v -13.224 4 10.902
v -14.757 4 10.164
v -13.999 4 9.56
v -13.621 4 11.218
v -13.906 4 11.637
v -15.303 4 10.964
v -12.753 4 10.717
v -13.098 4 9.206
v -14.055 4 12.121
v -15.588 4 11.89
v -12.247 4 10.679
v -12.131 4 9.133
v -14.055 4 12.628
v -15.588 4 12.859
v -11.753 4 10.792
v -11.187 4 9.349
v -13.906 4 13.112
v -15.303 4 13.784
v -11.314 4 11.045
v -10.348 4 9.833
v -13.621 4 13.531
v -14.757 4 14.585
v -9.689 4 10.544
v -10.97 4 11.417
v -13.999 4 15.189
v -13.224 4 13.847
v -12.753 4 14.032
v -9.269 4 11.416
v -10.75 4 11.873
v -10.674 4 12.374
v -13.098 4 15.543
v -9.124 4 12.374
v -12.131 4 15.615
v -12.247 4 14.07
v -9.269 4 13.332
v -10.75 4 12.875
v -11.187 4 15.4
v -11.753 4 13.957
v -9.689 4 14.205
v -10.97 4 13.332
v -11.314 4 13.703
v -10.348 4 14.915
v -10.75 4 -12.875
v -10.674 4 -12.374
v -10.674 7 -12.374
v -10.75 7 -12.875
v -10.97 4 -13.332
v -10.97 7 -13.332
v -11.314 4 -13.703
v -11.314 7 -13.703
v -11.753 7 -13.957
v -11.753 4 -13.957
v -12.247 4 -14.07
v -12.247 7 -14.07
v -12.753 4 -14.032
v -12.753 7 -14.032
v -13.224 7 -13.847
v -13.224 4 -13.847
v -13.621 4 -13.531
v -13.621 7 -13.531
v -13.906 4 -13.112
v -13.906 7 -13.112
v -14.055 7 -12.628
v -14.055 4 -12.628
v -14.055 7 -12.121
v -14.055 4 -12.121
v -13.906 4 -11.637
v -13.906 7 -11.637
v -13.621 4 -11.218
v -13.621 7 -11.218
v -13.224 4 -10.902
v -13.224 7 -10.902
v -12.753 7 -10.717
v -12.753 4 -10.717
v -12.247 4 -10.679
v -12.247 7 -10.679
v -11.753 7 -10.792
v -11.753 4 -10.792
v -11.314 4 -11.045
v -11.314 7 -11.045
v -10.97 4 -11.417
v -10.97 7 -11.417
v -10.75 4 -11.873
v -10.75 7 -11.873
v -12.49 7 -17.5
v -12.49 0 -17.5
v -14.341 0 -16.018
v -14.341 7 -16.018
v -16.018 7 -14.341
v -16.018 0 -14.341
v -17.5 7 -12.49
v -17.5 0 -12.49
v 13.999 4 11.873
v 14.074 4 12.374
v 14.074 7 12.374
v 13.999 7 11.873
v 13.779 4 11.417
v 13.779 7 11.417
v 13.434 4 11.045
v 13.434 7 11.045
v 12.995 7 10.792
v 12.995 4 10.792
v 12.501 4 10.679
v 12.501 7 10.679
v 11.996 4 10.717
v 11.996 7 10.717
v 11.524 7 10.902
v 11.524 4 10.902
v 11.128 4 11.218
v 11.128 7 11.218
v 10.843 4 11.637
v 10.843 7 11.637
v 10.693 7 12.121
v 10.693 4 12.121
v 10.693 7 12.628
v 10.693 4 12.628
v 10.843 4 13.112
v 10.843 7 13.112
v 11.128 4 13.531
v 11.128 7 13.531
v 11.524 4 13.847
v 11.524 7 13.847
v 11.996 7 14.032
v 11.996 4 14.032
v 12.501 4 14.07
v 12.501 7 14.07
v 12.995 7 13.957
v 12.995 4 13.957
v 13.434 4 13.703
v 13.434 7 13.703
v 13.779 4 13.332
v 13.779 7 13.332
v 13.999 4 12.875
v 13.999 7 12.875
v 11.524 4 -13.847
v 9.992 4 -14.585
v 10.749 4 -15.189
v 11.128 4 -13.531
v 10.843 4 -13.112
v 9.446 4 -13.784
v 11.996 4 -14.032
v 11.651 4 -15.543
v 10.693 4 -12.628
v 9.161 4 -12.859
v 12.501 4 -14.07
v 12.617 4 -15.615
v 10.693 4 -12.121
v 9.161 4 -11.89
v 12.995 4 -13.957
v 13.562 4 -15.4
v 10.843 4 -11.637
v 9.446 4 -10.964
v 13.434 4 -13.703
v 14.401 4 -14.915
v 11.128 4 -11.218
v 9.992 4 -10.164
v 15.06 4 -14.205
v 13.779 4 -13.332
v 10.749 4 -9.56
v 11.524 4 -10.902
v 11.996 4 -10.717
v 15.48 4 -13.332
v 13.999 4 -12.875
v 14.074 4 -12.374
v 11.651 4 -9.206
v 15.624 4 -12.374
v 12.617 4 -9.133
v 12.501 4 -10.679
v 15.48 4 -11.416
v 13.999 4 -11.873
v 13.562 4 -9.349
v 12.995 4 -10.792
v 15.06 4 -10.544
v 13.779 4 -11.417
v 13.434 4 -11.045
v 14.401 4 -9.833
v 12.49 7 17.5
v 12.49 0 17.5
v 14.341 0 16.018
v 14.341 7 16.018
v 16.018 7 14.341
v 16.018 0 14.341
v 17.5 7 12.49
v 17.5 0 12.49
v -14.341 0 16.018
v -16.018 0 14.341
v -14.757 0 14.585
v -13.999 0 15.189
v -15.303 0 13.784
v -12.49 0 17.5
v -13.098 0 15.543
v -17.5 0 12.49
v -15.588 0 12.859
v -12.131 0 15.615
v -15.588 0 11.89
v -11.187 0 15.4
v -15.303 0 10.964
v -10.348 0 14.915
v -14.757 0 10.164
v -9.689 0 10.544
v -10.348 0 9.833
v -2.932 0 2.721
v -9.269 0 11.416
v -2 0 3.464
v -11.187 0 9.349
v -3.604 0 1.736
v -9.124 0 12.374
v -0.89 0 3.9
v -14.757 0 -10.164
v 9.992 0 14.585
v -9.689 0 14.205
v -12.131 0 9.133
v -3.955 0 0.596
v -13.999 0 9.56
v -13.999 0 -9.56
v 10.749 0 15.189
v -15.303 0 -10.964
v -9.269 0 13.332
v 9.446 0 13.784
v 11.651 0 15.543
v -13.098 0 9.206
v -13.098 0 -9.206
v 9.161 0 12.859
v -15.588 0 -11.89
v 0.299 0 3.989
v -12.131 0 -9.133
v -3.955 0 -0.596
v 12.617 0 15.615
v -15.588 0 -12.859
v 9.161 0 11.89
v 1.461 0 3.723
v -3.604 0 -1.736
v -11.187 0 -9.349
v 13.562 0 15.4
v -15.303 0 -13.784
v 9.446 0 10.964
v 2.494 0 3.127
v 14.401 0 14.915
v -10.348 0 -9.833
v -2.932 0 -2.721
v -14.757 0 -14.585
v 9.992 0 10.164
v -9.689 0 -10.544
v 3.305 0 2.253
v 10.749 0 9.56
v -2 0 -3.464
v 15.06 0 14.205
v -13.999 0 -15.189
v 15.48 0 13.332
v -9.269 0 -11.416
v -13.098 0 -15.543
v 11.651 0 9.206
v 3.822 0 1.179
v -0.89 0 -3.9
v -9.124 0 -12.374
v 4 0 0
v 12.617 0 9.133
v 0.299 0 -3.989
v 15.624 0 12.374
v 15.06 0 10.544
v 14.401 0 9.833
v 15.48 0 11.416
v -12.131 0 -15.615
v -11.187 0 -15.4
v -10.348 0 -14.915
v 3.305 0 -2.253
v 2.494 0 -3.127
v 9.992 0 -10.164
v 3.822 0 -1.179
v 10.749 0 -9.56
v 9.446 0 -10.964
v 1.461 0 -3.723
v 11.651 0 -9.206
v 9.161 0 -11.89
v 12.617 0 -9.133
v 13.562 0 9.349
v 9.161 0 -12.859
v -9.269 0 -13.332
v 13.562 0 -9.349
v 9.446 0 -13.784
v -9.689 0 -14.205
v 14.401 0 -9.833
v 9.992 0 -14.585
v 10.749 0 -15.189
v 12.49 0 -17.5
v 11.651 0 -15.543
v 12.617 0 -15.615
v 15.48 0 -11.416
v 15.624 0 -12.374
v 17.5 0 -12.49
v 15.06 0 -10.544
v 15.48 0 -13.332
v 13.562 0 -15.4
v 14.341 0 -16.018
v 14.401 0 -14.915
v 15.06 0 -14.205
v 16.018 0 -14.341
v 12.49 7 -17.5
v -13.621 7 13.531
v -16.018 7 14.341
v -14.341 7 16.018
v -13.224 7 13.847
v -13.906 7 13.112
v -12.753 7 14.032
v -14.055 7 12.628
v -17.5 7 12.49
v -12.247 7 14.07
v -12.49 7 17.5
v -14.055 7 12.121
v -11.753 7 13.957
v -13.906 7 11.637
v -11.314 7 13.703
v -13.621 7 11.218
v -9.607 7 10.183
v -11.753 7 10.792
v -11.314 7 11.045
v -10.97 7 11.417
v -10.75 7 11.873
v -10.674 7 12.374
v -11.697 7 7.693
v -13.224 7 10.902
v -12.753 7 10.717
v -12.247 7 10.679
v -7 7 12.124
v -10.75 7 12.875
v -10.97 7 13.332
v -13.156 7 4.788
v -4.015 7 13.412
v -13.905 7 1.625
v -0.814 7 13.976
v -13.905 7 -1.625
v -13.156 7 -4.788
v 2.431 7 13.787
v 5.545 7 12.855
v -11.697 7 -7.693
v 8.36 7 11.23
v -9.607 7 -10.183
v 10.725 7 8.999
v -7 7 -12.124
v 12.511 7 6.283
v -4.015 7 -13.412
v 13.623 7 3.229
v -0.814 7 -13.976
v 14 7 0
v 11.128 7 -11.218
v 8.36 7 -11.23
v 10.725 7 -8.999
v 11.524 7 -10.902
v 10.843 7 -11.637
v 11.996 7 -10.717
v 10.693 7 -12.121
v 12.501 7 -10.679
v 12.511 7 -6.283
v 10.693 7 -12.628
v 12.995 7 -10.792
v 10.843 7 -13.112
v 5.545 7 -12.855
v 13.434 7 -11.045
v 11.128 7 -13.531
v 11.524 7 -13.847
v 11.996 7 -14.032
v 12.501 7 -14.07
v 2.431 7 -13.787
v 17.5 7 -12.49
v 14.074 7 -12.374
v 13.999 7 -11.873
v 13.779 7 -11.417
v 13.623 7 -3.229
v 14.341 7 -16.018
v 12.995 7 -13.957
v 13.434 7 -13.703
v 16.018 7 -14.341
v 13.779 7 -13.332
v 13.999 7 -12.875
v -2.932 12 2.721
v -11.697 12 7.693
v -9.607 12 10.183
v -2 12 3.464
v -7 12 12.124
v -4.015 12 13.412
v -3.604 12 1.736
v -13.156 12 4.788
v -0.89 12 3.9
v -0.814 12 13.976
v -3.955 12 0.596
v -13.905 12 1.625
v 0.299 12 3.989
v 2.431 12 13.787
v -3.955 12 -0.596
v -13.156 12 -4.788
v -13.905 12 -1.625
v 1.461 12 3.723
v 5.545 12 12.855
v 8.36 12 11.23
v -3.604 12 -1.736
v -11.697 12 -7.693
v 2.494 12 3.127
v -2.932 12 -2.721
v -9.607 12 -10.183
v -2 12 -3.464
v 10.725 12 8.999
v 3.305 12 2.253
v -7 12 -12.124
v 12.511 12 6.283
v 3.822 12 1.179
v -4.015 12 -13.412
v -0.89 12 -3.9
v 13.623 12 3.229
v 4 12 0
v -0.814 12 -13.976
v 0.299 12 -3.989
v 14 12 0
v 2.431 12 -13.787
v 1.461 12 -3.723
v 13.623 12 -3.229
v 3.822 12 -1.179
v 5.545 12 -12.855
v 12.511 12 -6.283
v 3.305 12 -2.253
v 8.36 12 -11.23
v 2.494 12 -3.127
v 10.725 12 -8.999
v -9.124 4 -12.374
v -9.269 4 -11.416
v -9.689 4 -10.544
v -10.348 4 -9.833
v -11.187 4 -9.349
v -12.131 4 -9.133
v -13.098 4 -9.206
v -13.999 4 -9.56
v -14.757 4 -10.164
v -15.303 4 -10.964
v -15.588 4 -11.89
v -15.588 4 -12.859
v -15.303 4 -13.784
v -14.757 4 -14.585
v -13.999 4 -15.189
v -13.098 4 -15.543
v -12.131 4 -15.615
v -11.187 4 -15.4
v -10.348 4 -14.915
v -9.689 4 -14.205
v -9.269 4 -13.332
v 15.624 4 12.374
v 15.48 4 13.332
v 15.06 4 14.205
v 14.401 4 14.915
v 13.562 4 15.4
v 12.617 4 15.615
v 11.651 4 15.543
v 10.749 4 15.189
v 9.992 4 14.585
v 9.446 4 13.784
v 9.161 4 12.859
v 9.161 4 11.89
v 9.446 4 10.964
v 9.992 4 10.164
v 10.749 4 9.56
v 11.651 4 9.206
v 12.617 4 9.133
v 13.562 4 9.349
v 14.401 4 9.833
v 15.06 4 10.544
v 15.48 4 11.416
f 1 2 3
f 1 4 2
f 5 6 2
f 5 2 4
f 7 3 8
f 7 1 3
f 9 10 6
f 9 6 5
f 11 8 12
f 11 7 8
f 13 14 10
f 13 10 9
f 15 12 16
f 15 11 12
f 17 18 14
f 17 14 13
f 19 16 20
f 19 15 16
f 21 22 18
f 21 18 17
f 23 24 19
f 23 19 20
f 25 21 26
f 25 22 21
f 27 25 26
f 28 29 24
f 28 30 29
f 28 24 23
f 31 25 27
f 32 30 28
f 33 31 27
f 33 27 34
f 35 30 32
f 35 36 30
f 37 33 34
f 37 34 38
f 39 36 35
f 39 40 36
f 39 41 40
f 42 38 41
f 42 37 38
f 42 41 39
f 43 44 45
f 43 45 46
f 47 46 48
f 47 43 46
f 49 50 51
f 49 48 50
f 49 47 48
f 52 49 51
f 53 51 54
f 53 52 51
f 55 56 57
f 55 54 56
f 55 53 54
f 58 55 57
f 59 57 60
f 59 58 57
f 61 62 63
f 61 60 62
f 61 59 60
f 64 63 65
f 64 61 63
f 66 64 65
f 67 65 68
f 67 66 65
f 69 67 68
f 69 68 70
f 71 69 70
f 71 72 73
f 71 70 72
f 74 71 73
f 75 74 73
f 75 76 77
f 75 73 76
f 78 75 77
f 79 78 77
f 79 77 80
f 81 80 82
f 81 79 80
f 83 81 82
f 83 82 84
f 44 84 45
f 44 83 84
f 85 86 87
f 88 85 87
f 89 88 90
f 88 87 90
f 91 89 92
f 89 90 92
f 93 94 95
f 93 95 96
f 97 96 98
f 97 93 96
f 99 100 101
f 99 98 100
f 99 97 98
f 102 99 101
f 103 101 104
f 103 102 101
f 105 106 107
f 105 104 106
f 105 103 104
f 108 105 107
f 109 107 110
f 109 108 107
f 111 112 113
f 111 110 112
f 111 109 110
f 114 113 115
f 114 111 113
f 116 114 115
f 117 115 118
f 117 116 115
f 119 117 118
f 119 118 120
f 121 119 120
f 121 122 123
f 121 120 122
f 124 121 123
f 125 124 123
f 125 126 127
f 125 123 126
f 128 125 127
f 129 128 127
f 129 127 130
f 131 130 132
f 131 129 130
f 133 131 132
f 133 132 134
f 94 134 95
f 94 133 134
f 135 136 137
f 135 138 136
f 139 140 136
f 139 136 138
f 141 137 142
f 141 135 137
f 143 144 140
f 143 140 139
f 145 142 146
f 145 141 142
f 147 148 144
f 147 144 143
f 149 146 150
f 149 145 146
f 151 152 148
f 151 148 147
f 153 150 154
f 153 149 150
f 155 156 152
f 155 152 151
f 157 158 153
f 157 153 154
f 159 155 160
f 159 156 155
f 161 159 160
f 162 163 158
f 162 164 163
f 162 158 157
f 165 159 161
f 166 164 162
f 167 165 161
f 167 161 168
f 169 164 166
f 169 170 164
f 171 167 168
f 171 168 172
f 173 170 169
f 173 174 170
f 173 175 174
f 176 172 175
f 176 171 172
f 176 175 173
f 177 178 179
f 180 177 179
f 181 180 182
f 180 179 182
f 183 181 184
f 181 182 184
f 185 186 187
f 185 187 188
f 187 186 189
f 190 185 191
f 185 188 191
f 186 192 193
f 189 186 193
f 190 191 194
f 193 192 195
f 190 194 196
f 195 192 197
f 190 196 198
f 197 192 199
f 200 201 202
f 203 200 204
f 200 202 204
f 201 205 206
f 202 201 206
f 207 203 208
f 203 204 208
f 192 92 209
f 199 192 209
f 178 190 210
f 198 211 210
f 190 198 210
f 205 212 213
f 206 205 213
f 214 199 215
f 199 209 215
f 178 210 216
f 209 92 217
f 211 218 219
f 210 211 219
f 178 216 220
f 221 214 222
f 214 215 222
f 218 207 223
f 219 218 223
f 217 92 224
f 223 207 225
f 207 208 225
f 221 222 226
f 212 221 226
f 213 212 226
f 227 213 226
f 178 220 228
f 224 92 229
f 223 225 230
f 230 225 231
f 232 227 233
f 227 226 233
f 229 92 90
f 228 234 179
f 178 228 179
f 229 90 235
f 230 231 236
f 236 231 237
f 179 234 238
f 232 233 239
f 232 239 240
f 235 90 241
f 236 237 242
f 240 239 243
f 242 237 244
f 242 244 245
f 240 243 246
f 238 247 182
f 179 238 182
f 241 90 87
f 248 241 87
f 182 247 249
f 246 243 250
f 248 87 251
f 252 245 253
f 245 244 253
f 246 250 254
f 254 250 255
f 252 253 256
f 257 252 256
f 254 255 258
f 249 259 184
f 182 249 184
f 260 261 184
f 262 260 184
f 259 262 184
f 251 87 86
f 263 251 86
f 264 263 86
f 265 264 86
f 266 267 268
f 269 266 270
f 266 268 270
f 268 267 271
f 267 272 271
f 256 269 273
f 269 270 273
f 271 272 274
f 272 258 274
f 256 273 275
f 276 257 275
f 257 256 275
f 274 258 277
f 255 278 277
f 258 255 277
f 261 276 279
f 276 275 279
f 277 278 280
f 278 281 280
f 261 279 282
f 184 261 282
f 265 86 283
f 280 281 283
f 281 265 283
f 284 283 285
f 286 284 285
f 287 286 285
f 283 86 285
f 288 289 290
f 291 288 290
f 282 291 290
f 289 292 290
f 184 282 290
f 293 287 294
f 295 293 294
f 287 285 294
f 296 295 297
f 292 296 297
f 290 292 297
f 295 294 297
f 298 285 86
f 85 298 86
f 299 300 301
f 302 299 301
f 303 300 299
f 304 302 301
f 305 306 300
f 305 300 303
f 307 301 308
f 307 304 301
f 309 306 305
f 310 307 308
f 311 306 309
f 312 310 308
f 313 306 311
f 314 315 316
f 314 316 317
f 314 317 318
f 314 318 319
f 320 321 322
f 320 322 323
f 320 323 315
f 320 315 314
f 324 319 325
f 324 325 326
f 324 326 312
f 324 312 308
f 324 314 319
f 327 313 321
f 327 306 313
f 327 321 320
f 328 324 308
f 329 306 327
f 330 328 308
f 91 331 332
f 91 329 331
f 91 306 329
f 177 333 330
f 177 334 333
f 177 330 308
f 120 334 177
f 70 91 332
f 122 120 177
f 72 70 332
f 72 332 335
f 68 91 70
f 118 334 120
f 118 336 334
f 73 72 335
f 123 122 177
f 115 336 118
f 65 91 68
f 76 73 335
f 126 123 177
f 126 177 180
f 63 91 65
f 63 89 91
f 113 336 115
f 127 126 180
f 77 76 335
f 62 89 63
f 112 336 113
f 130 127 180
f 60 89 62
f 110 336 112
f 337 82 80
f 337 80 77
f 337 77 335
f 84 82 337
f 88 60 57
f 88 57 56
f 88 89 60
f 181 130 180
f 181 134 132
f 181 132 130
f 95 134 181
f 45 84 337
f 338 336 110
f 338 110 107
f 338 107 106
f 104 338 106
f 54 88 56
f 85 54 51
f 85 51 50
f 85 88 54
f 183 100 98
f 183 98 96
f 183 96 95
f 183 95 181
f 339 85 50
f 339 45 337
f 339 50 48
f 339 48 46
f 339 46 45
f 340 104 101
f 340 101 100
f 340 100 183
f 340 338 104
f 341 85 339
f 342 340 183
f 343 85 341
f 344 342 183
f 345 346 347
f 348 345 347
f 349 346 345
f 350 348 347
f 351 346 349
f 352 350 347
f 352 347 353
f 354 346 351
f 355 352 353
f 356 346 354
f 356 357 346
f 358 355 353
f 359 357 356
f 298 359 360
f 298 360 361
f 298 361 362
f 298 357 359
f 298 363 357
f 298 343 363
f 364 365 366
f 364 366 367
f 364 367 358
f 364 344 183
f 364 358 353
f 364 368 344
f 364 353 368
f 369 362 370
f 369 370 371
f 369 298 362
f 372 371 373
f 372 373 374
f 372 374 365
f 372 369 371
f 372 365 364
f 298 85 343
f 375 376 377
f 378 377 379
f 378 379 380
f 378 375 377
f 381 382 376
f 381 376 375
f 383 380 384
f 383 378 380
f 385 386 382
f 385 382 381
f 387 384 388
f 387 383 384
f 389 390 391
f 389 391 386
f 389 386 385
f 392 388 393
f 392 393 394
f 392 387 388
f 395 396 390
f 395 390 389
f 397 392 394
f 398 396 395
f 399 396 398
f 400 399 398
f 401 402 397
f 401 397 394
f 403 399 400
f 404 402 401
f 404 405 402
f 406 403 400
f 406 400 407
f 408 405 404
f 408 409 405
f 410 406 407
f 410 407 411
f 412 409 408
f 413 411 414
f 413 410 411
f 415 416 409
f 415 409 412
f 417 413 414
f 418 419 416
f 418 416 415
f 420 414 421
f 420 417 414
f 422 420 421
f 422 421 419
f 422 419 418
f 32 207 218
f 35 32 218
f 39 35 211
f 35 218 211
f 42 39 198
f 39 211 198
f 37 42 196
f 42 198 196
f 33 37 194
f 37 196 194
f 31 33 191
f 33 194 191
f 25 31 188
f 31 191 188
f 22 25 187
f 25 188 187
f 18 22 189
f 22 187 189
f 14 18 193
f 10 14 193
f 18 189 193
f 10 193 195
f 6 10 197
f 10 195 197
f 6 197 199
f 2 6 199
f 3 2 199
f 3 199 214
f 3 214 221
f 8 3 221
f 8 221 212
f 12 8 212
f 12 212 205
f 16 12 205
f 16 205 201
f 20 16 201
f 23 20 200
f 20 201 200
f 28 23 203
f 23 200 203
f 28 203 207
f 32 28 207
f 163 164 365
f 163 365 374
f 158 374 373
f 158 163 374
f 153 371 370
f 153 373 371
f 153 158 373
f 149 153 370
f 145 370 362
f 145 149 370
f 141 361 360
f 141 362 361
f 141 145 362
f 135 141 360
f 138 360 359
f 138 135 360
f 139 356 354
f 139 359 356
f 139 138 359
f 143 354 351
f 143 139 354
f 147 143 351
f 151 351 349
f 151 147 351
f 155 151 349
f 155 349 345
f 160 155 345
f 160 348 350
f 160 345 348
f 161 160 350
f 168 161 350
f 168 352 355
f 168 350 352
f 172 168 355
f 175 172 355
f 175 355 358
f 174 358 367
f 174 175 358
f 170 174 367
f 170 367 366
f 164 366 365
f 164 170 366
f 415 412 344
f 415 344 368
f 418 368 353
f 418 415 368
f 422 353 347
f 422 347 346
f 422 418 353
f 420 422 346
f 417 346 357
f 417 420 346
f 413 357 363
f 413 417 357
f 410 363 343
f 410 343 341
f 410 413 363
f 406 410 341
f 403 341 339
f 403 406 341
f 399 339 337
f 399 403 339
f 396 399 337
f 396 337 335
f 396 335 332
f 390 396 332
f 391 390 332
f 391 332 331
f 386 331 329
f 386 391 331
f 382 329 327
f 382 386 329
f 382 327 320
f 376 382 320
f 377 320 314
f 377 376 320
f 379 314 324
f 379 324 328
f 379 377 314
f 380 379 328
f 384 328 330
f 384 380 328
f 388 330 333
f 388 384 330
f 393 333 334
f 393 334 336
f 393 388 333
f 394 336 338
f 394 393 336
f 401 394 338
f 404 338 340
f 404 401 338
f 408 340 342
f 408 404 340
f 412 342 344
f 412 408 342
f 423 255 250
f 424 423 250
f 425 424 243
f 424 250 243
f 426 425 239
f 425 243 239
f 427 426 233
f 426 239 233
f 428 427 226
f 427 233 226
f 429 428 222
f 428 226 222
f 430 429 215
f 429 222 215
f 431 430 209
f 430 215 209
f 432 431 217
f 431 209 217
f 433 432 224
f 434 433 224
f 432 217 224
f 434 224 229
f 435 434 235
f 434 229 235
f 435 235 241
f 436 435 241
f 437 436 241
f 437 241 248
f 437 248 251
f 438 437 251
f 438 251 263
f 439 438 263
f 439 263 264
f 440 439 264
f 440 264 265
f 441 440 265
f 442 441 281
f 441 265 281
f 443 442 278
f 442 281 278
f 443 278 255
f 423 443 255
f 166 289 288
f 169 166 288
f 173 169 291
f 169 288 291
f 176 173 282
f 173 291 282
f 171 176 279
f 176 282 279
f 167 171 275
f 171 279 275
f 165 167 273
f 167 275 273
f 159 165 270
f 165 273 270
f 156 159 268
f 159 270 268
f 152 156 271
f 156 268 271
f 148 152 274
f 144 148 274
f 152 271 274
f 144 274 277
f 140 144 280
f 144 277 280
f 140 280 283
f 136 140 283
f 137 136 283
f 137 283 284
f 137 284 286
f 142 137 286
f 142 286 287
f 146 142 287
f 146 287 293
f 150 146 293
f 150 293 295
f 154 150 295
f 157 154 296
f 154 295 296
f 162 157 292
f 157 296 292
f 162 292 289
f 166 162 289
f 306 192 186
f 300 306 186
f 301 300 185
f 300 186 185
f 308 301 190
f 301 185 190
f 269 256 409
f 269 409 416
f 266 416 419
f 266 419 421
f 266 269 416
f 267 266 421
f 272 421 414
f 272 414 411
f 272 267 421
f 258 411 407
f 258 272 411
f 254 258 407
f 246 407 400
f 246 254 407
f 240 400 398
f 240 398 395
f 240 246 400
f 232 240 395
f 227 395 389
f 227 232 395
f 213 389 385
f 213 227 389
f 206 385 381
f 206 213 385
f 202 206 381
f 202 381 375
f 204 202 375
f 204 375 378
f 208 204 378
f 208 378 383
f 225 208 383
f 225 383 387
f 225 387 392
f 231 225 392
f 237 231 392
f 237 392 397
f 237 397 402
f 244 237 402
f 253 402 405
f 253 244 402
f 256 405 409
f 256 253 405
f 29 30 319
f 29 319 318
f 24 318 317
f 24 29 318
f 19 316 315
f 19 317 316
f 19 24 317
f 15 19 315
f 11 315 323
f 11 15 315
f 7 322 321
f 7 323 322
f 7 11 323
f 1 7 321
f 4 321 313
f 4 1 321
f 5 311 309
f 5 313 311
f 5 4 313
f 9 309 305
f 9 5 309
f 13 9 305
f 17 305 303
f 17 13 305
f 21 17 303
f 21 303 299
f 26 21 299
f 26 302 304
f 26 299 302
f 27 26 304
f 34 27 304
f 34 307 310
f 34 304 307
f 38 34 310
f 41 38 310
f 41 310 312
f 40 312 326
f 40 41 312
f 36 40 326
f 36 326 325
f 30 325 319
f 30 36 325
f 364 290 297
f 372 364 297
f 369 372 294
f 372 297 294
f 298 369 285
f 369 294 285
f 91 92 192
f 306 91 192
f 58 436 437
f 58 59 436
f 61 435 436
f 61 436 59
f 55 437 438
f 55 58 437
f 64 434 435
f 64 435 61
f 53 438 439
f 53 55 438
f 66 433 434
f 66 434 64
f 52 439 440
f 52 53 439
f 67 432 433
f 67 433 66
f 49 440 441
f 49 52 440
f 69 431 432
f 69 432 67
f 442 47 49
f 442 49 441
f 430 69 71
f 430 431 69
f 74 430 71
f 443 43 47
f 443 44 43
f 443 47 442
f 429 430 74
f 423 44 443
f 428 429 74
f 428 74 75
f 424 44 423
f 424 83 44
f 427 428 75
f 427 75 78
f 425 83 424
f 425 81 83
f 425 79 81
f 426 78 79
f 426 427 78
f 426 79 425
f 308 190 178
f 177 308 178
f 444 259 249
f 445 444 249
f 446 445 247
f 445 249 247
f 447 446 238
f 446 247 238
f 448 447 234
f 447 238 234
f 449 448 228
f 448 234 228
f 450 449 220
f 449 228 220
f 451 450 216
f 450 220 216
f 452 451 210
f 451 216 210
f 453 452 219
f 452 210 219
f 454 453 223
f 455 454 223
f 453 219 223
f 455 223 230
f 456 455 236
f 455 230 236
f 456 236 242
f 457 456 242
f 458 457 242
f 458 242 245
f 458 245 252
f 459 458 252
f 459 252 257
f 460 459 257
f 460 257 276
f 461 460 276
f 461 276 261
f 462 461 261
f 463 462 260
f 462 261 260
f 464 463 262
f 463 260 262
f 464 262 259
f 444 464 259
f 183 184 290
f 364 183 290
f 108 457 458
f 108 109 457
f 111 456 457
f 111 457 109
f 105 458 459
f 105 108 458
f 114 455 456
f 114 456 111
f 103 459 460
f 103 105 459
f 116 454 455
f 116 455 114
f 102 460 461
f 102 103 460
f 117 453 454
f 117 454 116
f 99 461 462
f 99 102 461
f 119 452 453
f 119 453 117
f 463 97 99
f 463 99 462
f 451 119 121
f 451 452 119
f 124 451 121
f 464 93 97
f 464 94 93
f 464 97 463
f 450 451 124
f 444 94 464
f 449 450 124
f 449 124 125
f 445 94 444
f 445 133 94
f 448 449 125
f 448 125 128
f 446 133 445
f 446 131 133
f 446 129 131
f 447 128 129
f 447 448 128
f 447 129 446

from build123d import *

# Parameters (mm, degrees)
SKETCH_5_R          = 4
SKETCH_5_R_2        = 1.7
EXTRUDE_2_DEPTH     = 12
SKETCH_7_W          = 35
SKETCH_7_H          = 35
SKETCH_7_R          = 14
CUT_EXTRUDE_4_DEPTH = 5
SKETCH_8_R          = 3.25
CUT_EXTRUDE_5_DEPTH = 4


with BuildPart() as part:
    # Эскиз5 → Бобышка-Вытянуть2 (new body)
    with BuildSketch(Plane(origin=(0, 0, 0), x_dir=(1, 0, 0), z_dir=(0, 1, 0))):
        with BuildLine():
            Line((-12.489995997, -17.5), (12.489995997, -17.5))
            ThreePointArc((12.489995997, -17.5), (15.202795796, -15.202795796), (17.5, -12.489995997))
            Line((17.5, -12.489995997), (17.5, 12.489995997))
            ThreePointArc((17.5, 12.489995997), (15.202795796, 15.202795796), (12.489995997, 17.5))
            Line((12.489995997, 17.5), (-12.489995997, 17.5))
            ThreePointArc((-12.489995997, 17.5), (-15.202795796, 15.202795796), (-17.5, 12.489995997))
            Line((-17.5, 12.489995997), (-17.5, -12.489995997))
            ThreePointArc((-17.5, -12.489995997), (-15.202795796, -15.202795796), (-12.489995997, -17.5))
        make_face()
        Circle(SKETCH_5_R, mode=Mode.SUBTRACT)
        with Locations((-12.374368671, 12.374368671)):
            Circle(SKETCH_5_R_2, mode=Mode.SUBTRACT)
        with Locations((12.374368671, 12.374368671)):
            Circle(SKETCH_5_R_2, mode=Mode.SUBTRACT)
        with Locations((12.374368671, -12.374368671)):
            Circle(SKETCH_5_R_2, mode=Mode.SUBTRACT)
        with Locations((-12.374368671, -12.374368671)):
            Circle(SKETCH_5_R_2, mode=Mode.SUBTRACT)
    extrude(amount=EXTRUDE_2_DEPTH)

    # Эскиз7 → Вырез-Вытянуть4 (cut)
    with BuildSketch(Plane(origin=(0, 12, 0), x_dir=(1, 0, 0), z_dir=(0, 1, 0))):
        Rectangle(SKETCH_7_W, SKETCH_7_H)
        Circle(SKETCH_7_R, mode=Mode.SUBTRACT)
    extrude(amount=-CUT_EXTRUDE_4_DEPTH, mode=Mode.SUBTRACT)

    # Эскиз8 → Вырез-Вытянуть5 (cut)
    with BuildSketch(Plane.XZ):
        with Locations((-12.374368671, 12.374368671)):
            Circle(SKETCH_8_R)
        with Locations((12.374368671, 12.374368671)):
            Circle(SKETCH_8_R)
        with Locations((12.374368671, -12.374368671)):
            Circle(SKETCH_8_R)
        with Locations((-12.374368671, -12.374368671)):
            Circle(SKETCH_8_R)
    extrude(amount=-CUT_EXTRUDE_5_DEPTH, mode=Mode.SUBTRACT)


solid = part.part
